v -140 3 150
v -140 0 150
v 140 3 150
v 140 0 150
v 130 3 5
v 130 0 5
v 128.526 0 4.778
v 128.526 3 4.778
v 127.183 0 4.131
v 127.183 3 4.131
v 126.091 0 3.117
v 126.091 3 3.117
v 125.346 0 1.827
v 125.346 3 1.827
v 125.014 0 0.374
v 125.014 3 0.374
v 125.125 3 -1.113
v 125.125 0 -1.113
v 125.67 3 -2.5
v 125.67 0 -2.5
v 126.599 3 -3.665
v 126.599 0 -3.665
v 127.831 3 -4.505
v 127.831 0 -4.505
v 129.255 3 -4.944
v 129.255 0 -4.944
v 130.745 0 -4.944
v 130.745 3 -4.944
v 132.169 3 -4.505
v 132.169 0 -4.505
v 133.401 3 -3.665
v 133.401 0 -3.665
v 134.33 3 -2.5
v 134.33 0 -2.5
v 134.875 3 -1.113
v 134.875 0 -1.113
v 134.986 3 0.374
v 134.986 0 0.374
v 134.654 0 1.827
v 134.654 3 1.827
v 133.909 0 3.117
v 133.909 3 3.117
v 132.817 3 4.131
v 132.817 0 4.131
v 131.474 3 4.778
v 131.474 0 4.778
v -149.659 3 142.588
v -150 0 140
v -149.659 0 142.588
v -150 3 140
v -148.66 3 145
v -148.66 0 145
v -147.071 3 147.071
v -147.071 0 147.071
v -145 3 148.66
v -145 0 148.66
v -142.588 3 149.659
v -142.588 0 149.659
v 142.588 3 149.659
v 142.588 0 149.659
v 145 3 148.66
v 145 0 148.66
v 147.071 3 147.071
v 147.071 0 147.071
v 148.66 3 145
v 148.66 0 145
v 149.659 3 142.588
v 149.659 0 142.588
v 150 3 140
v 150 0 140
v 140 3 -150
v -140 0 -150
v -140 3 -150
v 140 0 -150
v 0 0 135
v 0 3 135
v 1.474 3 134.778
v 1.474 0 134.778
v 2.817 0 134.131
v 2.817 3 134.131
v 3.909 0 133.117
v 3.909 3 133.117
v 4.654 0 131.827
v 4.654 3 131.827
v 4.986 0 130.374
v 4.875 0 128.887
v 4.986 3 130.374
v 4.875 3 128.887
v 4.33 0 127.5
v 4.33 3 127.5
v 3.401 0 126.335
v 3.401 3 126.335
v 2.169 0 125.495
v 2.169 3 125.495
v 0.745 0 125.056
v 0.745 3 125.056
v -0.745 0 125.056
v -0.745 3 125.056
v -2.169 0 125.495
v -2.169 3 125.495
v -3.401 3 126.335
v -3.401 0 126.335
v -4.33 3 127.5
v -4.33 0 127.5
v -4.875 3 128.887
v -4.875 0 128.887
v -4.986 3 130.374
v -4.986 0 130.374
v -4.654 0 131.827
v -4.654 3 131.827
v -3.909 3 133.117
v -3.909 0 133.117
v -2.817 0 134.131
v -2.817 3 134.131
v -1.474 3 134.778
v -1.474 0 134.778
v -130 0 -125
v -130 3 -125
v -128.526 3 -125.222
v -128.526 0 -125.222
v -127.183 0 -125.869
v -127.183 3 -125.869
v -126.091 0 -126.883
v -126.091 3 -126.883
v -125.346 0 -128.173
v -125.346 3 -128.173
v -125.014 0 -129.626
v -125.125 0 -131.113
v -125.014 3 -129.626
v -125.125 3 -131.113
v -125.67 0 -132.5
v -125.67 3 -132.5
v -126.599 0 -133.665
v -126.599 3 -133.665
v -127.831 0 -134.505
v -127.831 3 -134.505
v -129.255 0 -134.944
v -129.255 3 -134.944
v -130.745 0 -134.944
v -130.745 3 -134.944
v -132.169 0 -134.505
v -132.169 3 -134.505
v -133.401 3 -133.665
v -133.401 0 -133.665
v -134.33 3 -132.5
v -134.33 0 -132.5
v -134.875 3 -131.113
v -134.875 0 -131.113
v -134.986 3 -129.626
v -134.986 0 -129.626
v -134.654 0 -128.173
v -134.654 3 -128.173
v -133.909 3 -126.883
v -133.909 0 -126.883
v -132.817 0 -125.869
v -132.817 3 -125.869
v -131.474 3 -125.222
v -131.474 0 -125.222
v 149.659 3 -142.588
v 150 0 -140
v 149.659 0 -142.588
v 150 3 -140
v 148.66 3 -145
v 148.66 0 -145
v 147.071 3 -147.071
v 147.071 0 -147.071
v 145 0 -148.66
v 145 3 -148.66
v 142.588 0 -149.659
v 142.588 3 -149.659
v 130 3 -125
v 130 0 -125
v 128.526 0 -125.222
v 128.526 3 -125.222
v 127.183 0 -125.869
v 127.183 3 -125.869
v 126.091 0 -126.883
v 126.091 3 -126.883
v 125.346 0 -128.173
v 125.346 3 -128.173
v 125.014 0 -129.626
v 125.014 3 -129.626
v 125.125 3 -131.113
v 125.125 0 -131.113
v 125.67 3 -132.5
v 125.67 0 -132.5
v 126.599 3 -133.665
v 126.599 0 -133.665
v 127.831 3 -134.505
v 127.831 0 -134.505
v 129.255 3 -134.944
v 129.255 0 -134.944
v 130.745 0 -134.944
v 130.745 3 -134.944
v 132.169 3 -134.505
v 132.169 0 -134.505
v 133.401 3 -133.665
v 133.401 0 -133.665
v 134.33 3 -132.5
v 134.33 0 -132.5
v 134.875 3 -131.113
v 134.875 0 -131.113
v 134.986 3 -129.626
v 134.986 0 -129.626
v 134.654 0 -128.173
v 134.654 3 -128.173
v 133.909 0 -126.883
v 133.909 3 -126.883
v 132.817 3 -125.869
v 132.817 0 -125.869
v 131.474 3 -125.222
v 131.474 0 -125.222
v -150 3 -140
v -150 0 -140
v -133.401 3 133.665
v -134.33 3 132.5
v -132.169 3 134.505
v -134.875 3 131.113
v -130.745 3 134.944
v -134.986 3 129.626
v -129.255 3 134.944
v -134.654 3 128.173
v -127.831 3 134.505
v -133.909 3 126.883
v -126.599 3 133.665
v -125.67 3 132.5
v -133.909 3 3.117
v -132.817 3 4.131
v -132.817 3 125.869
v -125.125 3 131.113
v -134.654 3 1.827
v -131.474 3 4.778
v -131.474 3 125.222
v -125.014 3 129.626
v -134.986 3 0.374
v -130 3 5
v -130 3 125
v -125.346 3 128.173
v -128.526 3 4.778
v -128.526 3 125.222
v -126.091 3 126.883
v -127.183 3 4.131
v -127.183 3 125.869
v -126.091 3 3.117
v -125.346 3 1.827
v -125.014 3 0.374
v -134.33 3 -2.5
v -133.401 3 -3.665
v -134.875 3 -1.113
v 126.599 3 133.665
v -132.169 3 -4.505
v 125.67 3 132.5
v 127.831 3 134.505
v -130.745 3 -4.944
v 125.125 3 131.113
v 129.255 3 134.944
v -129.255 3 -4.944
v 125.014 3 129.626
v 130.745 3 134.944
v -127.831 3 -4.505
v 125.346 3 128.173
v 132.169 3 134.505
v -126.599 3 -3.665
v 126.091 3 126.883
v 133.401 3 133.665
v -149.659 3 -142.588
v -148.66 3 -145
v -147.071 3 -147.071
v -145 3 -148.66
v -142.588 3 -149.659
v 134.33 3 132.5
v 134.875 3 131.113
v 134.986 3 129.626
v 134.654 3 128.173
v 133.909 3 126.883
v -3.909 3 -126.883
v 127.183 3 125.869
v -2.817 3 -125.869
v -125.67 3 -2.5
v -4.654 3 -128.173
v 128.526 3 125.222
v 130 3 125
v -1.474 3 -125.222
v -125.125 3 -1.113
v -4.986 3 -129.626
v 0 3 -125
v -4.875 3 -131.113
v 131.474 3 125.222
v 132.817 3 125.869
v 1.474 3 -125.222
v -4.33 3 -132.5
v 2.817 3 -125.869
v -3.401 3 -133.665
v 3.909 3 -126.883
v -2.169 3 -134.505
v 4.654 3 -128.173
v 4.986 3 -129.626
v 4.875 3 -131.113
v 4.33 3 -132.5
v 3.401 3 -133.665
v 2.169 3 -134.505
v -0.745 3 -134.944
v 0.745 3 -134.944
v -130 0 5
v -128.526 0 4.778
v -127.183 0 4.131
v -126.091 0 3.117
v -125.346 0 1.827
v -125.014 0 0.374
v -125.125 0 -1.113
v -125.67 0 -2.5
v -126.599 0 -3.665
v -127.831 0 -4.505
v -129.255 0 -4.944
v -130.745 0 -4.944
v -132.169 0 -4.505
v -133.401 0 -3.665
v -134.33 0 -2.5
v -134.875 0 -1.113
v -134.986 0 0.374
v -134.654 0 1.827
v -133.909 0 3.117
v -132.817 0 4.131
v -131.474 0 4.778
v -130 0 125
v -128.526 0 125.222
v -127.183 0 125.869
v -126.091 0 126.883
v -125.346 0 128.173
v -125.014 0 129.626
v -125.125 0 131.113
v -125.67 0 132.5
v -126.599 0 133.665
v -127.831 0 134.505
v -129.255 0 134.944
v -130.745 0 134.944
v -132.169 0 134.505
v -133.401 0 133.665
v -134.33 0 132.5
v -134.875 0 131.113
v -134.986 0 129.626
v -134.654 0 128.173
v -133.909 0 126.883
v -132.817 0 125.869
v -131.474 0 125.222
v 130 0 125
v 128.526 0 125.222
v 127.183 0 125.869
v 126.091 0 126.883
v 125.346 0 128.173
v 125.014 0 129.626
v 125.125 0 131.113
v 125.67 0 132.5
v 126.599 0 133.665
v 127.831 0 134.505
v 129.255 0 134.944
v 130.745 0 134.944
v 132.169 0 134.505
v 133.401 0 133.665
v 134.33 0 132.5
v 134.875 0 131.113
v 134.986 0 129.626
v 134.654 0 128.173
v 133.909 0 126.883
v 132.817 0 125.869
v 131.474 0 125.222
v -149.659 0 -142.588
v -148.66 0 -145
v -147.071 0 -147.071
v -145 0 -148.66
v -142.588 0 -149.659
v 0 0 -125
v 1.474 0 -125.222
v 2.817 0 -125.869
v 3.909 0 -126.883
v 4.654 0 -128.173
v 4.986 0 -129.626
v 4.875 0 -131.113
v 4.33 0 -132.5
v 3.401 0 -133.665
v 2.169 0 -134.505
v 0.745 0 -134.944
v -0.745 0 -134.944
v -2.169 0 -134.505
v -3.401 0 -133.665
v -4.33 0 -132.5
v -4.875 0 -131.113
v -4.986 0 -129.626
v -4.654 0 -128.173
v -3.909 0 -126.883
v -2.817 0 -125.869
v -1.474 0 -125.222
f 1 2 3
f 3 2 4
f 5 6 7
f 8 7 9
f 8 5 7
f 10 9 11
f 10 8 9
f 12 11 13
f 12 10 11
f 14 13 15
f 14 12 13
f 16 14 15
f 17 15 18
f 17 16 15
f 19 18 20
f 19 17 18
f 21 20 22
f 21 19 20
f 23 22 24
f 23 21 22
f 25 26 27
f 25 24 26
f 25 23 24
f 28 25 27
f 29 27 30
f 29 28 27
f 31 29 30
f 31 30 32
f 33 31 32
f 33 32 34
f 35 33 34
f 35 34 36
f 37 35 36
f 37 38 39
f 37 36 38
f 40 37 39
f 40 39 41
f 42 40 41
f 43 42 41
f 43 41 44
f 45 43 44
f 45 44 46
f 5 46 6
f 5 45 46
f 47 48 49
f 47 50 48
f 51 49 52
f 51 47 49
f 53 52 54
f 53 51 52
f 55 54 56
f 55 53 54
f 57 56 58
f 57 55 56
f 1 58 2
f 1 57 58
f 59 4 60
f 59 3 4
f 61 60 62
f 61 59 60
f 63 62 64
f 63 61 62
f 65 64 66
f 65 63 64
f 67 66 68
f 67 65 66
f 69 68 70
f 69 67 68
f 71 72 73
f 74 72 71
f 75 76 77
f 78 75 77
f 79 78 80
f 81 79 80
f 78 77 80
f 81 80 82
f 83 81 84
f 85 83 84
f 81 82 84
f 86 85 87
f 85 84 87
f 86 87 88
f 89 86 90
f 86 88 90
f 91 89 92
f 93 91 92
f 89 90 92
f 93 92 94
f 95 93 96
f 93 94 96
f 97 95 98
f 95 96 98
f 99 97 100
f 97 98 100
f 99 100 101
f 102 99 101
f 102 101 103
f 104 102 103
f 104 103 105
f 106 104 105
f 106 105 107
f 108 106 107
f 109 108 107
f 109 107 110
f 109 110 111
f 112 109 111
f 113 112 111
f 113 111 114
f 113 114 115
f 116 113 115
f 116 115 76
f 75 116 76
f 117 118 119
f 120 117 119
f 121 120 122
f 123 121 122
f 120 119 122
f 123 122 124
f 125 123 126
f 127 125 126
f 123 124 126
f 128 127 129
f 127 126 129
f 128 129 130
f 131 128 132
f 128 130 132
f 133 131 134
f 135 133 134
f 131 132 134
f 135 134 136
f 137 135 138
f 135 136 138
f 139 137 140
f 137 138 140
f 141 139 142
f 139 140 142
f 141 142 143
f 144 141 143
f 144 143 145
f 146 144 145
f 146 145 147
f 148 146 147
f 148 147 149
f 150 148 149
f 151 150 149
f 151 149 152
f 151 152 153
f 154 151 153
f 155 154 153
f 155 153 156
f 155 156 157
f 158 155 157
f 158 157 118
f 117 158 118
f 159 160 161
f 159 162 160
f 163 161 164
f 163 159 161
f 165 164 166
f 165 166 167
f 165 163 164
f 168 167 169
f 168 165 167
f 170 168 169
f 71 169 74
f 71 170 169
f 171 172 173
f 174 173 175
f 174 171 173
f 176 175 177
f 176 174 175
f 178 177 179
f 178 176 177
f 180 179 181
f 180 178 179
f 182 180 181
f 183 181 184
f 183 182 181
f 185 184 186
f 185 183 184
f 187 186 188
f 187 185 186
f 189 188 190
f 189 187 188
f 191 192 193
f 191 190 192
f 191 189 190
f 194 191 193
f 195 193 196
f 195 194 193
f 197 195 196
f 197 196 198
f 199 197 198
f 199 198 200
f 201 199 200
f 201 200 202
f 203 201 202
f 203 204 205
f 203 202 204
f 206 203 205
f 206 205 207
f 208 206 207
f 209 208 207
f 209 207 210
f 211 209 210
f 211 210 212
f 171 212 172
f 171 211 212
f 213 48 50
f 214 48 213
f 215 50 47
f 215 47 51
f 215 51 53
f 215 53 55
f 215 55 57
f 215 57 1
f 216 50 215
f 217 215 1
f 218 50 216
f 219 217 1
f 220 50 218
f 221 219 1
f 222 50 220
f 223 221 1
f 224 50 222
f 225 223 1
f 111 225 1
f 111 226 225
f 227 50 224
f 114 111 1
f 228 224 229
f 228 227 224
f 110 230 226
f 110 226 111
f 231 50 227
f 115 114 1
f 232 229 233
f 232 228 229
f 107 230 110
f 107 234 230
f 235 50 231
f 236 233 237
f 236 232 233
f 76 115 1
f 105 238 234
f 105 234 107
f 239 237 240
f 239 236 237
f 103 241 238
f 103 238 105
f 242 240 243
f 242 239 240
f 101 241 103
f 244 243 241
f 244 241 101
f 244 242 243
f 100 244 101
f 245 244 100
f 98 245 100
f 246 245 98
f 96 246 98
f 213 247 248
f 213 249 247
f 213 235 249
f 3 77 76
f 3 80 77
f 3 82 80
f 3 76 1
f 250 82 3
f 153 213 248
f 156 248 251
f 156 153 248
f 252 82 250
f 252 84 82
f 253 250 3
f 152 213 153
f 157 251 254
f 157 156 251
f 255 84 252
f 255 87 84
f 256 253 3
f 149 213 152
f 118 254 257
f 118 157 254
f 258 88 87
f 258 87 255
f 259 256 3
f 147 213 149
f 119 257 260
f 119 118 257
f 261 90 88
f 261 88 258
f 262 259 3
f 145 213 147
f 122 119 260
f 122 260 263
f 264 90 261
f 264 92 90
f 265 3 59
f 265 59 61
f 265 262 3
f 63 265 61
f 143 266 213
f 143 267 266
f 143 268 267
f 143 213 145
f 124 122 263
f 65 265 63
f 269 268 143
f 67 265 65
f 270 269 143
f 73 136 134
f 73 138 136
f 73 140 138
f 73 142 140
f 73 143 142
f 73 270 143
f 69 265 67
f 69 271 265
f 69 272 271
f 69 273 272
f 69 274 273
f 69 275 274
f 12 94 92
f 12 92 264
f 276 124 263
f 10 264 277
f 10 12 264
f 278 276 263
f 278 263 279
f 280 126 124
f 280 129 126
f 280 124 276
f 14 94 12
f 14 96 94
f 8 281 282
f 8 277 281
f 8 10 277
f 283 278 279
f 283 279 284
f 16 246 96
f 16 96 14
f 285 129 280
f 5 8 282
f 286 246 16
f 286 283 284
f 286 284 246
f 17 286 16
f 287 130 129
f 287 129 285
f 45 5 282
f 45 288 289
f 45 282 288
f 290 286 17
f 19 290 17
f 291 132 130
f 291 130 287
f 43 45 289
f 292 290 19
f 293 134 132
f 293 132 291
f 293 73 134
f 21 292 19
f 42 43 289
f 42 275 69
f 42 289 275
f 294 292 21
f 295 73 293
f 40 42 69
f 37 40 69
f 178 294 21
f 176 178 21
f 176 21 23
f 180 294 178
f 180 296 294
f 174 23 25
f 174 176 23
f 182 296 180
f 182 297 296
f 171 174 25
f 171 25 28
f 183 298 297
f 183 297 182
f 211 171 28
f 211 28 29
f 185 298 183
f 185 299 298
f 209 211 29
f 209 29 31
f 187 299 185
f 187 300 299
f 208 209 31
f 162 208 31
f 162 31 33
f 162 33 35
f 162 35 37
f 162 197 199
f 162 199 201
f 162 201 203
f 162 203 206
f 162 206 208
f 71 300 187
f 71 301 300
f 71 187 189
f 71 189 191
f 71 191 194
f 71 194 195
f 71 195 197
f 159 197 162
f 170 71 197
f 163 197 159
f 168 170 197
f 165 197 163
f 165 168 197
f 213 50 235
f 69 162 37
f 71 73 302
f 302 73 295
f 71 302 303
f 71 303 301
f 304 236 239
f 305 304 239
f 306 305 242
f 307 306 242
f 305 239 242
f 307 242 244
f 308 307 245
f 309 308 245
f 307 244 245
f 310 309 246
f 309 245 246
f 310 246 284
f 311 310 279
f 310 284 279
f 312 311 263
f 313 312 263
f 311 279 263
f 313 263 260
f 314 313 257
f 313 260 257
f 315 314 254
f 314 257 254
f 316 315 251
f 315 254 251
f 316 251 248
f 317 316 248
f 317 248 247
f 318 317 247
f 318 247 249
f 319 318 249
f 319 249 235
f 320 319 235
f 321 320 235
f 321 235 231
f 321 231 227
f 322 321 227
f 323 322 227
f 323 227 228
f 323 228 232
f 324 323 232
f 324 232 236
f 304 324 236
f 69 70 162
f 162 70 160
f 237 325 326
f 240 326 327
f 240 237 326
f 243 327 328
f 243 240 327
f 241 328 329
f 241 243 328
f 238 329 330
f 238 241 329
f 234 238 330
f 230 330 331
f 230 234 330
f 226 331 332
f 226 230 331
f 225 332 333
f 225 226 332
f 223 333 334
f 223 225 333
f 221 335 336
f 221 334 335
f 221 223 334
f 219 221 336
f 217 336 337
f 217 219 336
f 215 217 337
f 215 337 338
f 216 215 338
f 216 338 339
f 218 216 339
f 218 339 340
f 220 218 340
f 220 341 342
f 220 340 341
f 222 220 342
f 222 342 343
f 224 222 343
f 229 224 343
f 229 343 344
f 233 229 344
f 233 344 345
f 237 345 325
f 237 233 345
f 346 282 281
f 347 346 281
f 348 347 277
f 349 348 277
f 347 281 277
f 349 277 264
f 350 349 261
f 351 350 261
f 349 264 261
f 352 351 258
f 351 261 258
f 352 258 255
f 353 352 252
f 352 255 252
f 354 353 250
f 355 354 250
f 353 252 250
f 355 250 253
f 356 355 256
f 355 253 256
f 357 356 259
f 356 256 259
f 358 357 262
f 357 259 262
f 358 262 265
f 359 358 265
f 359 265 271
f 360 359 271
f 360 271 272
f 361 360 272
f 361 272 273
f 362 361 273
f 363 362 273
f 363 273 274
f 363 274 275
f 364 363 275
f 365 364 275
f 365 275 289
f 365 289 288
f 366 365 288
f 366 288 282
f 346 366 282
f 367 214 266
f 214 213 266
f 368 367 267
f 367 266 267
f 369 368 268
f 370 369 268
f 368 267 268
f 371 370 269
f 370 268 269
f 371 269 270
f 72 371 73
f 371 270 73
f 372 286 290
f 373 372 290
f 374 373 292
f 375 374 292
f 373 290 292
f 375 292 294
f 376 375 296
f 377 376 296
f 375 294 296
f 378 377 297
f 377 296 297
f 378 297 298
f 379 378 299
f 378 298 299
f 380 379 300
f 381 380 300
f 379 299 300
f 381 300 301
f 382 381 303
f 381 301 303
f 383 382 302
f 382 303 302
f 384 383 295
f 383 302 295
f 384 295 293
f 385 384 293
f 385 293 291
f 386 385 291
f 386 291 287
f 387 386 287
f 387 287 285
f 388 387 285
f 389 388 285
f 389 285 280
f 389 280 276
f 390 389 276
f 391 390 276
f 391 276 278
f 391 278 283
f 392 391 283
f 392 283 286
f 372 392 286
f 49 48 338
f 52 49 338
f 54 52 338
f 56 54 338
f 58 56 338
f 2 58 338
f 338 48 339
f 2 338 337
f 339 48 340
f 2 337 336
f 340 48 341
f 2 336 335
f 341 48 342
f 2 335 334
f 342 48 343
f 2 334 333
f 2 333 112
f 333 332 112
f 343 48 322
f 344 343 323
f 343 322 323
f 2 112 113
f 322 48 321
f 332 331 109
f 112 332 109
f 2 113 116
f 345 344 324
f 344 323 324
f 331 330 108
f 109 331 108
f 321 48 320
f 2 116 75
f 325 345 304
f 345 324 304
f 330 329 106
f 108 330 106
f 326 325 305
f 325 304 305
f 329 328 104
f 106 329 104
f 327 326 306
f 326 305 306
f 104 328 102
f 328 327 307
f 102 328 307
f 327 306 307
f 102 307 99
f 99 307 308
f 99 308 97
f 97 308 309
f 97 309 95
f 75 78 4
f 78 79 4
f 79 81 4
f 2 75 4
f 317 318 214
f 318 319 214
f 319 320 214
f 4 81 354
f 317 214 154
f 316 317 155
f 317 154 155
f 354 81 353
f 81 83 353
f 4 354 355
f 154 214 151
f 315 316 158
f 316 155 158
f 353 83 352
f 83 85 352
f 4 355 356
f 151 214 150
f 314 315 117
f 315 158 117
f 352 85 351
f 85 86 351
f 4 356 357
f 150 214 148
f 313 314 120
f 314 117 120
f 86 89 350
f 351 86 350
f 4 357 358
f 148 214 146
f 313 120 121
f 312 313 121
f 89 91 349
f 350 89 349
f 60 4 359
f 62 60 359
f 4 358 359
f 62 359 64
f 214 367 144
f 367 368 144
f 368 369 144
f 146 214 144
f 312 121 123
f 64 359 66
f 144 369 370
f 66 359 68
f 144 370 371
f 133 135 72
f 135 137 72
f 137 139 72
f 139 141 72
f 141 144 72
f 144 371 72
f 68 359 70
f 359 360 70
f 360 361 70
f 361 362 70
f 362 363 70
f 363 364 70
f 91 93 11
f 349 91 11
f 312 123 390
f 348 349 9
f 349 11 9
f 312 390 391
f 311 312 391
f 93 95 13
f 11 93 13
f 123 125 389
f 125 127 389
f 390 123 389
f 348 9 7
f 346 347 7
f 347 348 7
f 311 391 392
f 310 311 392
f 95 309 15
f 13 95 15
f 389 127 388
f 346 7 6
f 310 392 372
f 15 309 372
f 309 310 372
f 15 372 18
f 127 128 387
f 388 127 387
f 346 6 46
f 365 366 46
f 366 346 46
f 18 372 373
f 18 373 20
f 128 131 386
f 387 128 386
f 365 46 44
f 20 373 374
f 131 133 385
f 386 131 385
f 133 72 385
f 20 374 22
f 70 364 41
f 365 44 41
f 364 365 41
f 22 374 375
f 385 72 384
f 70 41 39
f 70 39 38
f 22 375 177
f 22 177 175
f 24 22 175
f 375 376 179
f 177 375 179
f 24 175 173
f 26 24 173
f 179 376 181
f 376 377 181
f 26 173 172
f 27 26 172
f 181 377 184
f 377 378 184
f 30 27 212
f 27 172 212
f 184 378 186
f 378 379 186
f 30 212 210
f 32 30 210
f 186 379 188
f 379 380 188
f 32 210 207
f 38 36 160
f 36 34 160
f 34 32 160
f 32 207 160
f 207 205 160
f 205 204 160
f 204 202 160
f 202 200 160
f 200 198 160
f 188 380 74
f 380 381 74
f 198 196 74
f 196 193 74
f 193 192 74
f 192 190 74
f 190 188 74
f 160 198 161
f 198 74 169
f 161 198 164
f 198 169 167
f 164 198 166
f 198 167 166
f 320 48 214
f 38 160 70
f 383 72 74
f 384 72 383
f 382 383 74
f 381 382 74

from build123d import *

# Parameters (mm, degrees)
SKETCH_1_W               = 300
SKETCH_1_H               = 300
EXTRUDE_1_DEPTH          = 3
FILLET_1_R               = 10
SKETCH_2_R               = 5
CUT_EXTRUDE_1_DEPTH      = 213.153246499
MIRROR_2_COPY_1_SKETCH_R = 5
MIRROR_2_COPY_1_DEPTH    = 213.153246499
SKETCH_3_R               = 5
CUT_EXTRUDE_2_DEPTH      = 213.153246499
SKETCH_4_R               = 5
CUT_EXTRUDE_3_DEPTH      = 213.153246499


with BuildPart() as part:
    # 草图1 → 凸台-拉伸1 (new body)
    with BuildSketch(Plane(origin=(0, 0, 0), x_dir=(1, 0, 0), z_dir=(0, 1, 0))):
        Rectangle(SKETCH_1_W, SKETCH_1_H)
    extrude(amount=EXTRUDE_1_DEPTH)

    # 圆角1
    fillet_1_edges = [part.edges().sort_by_distance(p)[0] for p in [
        (-150, 1.5, -150),
        (150, 1.5, -150),
        (150, 1.5, 150),
        (-150, 1.5, 150),
    ]]
    fillet(fillet_1_edges, radius=FILLET_1_R)

    # 草图2 → 切除-拉伸1 (cut, through all)
    with BuildSketch(Plane(origin=(0, 3, 0), x_dir=(1, 0, 0), z_dir=(0, 1, 0))):
        with Locations(Location((-130, 130, 0), (0, 0, 270))):
            Circle(SKETCH_2_R)
    cut_extrude_1 = extrude(amount=-CUT_EXTRUDE_1_DEPTH, mode=Mode.SUBTRACT)

    # 镜向1: 切除-拉伸1 across plane
    add(cut_extrude_1.mirror(Plane.XY), mode=Mode.SUBTRACT)

    # 镜向2: 切除-拉伸1 across plane
    add(cut_extrude_1.mirror(Plane(origin=(0, 0, 0), x_dir=(0, 0, 1), z_dir=(1, 0, 0))), mode=Mode.SUBTRACT)

    # 镜向2 copy 1 sketch → 镜向2 copy 1 (cut, through all)
    with BuildSketch(Plane(origin=(0, 3, 0), x_dir=(-1, 0, 0), z_dir=(0, 1, 0))):
        with Locations(Location((-130, 130, 0), (0, 0, 270))):
            Circle(MIRROR_2_COPY_1_SKETCH_R)
    extrude(amount=-MIRROR_2_COPY_1_DEPTH, mode=Mode.SUBTRACT)

    # 草图3 → 切除-拉伸2 (cut, through all)
    with BuildSketch(Plane(origin=(0, 3, 0), x_dir=(1, 0, 0), z_dir=(0, 1, 0))):
        with Locations(Location((-130, 0, 0), (0, 0, 270))):
            Circle(SKETCH_3_R)
    cut_extrude_2 = extrude(amount=-CUT_EXTRUDE_2_DEPTH, mode=Mode.SUBTRACT)

    # 镜向3: 切除-拉伸2 across plane
    add(cut_extrude_2.mirror(Plane(origin=(0, 0, 0), x_dir=(0, 0, 1), z_dir=(1, 0, 0))), mode=Mode.SUBTRACT)

    # 草图4 → 切除-拉伸3 (cut, through all)
    with BuildSketch(Plane(origin=(0, 3, 0), x_dir=(1, 0, 0), z_dir=(0, 1, 0))):
        with Locations(Location((0, 130, 0), (0, 0, 270))):
            Circle(SKETCH_4_R)
        with Locations(Location((0, -130, 0), (0, 0, 270))):
            Circle(SKETCH_4_R)
    extrude(amount=-CUT_EXTRUDE_3_DEPTH, mode=Mode.SUBTRACT)


solid = part.part
